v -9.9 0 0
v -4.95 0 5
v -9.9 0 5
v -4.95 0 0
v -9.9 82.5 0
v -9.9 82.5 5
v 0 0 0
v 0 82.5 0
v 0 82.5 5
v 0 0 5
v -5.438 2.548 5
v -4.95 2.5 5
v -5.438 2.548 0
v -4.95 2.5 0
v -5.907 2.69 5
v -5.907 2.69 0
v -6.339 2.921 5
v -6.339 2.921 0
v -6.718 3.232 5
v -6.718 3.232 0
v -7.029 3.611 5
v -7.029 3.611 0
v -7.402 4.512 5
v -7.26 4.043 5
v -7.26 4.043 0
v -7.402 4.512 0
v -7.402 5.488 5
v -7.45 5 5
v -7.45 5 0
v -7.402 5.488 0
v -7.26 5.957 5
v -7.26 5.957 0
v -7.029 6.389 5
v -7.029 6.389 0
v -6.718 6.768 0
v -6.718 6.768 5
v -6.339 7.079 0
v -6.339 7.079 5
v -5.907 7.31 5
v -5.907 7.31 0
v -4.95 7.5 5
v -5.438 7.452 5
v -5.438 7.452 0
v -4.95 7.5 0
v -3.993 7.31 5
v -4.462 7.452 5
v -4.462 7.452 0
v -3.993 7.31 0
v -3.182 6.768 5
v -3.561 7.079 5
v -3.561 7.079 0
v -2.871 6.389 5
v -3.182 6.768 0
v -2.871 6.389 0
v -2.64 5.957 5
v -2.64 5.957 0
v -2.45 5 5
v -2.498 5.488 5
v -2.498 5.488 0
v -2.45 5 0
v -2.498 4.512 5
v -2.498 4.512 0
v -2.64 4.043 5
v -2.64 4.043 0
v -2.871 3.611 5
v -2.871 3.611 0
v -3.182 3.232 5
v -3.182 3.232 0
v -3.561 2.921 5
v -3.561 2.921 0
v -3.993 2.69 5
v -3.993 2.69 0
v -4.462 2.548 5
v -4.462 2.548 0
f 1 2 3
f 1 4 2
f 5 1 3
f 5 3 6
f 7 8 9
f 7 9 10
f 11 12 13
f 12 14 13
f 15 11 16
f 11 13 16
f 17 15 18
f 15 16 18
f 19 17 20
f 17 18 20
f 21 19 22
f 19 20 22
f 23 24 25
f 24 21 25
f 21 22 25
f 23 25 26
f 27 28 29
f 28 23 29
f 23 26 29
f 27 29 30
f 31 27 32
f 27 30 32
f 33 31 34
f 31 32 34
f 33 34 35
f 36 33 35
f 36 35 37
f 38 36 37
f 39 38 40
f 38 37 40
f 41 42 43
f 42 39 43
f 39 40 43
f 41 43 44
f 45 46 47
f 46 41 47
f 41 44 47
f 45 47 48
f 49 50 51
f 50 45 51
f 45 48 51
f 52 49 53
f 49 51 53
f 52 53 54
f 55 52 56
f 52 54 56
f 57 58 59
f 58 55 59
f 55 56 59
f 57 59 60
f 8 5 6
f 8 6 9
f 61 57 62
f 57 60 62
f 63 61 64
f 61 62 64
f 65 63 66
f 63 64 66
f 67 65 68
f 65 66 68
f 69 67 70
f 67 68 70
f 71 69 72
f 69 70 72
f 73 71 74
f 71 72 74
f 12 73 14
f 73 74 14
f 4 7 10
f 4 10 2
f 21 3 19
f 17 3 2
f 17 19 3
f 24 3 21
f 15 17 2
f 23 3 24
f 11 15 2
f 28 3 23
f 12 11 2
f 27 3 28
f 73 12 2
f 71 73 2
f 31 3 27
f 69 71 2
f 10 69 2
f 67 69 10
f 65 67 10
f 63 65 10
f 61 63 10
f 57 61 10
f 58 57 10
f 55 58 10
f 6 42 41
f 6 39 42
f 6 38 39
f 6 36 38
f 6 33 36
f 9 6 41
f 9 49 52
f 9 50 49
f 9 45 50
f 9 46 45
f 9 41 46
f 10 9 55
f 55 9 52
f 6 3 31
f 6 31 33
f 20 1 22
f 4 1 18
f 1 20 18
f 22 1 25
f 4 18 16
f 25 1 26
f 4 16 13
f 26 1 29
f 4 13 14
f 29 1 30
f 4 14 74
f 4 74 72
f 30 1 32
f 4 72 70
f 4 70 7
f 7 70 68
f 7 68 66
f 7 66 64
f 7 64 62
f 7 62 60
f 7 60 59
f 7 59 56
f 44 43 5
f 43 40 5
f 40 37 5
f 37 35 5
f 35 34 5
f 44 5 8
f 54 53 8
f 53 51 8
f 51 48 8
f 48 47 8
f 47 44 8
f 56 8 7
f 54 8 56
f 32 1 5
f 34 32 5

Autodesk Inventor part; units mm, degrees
ref_plane "YZ Plane" through (0, 0, 0) normal (1, 0, 0) x (0, 1, 0)
ref_plane "XZ Plane" through (0, 0, 0) normal (0, 1, 0) x (-1, 0, 0)
ref_plane "XY Plane" through (0, 0, 0) normal (0, 0, 1) x (1, 0, 0)
sketch "Sketch2" plane through (0, 0, 0) normal (0, 0, 1) x (1, 0, 0)
  line L0 (0, 0) -> (-9.9, 0)
  line L1 (-4.95, 0) -> (-4.95, 2.5)
  line L2 (-4.95, 0) -> (-2.45, 0) construction
  circle A0 centre (-4.95, 5) radius 2.5
  line L3 (-4.95, 7.5) -> (32.05, 7.5) construction
  line L4 (0, 0) -> (-9.9, 0)
  line L5 (0, 0) -> (-9.9, 0)
  line L6 (-4.95, 7.5) -> (66.05, 7.5) construction
  line L7 (-4.95, 7.5) -> (70.05, 7.5) construction
  line L8 (0, 0) -> (-9.9, 0)
  line L9 (-9.9, 0) -> (-9.9, 82.5)
  line L10 (-9.9, 82.5) -> (0, 82.5)
  line L11 (0, 82.5) -> (0, 0)
  dimension "d35" = 5
  dimension "d33" = 2.5
  dimension "d34" = 90
  dimension "d48" = 9.9
extrude "Extrusion6" add sketch "Sketch2" along normal blind 5
properties part number "Cube_Holder_SB_V1_(71mm)"
